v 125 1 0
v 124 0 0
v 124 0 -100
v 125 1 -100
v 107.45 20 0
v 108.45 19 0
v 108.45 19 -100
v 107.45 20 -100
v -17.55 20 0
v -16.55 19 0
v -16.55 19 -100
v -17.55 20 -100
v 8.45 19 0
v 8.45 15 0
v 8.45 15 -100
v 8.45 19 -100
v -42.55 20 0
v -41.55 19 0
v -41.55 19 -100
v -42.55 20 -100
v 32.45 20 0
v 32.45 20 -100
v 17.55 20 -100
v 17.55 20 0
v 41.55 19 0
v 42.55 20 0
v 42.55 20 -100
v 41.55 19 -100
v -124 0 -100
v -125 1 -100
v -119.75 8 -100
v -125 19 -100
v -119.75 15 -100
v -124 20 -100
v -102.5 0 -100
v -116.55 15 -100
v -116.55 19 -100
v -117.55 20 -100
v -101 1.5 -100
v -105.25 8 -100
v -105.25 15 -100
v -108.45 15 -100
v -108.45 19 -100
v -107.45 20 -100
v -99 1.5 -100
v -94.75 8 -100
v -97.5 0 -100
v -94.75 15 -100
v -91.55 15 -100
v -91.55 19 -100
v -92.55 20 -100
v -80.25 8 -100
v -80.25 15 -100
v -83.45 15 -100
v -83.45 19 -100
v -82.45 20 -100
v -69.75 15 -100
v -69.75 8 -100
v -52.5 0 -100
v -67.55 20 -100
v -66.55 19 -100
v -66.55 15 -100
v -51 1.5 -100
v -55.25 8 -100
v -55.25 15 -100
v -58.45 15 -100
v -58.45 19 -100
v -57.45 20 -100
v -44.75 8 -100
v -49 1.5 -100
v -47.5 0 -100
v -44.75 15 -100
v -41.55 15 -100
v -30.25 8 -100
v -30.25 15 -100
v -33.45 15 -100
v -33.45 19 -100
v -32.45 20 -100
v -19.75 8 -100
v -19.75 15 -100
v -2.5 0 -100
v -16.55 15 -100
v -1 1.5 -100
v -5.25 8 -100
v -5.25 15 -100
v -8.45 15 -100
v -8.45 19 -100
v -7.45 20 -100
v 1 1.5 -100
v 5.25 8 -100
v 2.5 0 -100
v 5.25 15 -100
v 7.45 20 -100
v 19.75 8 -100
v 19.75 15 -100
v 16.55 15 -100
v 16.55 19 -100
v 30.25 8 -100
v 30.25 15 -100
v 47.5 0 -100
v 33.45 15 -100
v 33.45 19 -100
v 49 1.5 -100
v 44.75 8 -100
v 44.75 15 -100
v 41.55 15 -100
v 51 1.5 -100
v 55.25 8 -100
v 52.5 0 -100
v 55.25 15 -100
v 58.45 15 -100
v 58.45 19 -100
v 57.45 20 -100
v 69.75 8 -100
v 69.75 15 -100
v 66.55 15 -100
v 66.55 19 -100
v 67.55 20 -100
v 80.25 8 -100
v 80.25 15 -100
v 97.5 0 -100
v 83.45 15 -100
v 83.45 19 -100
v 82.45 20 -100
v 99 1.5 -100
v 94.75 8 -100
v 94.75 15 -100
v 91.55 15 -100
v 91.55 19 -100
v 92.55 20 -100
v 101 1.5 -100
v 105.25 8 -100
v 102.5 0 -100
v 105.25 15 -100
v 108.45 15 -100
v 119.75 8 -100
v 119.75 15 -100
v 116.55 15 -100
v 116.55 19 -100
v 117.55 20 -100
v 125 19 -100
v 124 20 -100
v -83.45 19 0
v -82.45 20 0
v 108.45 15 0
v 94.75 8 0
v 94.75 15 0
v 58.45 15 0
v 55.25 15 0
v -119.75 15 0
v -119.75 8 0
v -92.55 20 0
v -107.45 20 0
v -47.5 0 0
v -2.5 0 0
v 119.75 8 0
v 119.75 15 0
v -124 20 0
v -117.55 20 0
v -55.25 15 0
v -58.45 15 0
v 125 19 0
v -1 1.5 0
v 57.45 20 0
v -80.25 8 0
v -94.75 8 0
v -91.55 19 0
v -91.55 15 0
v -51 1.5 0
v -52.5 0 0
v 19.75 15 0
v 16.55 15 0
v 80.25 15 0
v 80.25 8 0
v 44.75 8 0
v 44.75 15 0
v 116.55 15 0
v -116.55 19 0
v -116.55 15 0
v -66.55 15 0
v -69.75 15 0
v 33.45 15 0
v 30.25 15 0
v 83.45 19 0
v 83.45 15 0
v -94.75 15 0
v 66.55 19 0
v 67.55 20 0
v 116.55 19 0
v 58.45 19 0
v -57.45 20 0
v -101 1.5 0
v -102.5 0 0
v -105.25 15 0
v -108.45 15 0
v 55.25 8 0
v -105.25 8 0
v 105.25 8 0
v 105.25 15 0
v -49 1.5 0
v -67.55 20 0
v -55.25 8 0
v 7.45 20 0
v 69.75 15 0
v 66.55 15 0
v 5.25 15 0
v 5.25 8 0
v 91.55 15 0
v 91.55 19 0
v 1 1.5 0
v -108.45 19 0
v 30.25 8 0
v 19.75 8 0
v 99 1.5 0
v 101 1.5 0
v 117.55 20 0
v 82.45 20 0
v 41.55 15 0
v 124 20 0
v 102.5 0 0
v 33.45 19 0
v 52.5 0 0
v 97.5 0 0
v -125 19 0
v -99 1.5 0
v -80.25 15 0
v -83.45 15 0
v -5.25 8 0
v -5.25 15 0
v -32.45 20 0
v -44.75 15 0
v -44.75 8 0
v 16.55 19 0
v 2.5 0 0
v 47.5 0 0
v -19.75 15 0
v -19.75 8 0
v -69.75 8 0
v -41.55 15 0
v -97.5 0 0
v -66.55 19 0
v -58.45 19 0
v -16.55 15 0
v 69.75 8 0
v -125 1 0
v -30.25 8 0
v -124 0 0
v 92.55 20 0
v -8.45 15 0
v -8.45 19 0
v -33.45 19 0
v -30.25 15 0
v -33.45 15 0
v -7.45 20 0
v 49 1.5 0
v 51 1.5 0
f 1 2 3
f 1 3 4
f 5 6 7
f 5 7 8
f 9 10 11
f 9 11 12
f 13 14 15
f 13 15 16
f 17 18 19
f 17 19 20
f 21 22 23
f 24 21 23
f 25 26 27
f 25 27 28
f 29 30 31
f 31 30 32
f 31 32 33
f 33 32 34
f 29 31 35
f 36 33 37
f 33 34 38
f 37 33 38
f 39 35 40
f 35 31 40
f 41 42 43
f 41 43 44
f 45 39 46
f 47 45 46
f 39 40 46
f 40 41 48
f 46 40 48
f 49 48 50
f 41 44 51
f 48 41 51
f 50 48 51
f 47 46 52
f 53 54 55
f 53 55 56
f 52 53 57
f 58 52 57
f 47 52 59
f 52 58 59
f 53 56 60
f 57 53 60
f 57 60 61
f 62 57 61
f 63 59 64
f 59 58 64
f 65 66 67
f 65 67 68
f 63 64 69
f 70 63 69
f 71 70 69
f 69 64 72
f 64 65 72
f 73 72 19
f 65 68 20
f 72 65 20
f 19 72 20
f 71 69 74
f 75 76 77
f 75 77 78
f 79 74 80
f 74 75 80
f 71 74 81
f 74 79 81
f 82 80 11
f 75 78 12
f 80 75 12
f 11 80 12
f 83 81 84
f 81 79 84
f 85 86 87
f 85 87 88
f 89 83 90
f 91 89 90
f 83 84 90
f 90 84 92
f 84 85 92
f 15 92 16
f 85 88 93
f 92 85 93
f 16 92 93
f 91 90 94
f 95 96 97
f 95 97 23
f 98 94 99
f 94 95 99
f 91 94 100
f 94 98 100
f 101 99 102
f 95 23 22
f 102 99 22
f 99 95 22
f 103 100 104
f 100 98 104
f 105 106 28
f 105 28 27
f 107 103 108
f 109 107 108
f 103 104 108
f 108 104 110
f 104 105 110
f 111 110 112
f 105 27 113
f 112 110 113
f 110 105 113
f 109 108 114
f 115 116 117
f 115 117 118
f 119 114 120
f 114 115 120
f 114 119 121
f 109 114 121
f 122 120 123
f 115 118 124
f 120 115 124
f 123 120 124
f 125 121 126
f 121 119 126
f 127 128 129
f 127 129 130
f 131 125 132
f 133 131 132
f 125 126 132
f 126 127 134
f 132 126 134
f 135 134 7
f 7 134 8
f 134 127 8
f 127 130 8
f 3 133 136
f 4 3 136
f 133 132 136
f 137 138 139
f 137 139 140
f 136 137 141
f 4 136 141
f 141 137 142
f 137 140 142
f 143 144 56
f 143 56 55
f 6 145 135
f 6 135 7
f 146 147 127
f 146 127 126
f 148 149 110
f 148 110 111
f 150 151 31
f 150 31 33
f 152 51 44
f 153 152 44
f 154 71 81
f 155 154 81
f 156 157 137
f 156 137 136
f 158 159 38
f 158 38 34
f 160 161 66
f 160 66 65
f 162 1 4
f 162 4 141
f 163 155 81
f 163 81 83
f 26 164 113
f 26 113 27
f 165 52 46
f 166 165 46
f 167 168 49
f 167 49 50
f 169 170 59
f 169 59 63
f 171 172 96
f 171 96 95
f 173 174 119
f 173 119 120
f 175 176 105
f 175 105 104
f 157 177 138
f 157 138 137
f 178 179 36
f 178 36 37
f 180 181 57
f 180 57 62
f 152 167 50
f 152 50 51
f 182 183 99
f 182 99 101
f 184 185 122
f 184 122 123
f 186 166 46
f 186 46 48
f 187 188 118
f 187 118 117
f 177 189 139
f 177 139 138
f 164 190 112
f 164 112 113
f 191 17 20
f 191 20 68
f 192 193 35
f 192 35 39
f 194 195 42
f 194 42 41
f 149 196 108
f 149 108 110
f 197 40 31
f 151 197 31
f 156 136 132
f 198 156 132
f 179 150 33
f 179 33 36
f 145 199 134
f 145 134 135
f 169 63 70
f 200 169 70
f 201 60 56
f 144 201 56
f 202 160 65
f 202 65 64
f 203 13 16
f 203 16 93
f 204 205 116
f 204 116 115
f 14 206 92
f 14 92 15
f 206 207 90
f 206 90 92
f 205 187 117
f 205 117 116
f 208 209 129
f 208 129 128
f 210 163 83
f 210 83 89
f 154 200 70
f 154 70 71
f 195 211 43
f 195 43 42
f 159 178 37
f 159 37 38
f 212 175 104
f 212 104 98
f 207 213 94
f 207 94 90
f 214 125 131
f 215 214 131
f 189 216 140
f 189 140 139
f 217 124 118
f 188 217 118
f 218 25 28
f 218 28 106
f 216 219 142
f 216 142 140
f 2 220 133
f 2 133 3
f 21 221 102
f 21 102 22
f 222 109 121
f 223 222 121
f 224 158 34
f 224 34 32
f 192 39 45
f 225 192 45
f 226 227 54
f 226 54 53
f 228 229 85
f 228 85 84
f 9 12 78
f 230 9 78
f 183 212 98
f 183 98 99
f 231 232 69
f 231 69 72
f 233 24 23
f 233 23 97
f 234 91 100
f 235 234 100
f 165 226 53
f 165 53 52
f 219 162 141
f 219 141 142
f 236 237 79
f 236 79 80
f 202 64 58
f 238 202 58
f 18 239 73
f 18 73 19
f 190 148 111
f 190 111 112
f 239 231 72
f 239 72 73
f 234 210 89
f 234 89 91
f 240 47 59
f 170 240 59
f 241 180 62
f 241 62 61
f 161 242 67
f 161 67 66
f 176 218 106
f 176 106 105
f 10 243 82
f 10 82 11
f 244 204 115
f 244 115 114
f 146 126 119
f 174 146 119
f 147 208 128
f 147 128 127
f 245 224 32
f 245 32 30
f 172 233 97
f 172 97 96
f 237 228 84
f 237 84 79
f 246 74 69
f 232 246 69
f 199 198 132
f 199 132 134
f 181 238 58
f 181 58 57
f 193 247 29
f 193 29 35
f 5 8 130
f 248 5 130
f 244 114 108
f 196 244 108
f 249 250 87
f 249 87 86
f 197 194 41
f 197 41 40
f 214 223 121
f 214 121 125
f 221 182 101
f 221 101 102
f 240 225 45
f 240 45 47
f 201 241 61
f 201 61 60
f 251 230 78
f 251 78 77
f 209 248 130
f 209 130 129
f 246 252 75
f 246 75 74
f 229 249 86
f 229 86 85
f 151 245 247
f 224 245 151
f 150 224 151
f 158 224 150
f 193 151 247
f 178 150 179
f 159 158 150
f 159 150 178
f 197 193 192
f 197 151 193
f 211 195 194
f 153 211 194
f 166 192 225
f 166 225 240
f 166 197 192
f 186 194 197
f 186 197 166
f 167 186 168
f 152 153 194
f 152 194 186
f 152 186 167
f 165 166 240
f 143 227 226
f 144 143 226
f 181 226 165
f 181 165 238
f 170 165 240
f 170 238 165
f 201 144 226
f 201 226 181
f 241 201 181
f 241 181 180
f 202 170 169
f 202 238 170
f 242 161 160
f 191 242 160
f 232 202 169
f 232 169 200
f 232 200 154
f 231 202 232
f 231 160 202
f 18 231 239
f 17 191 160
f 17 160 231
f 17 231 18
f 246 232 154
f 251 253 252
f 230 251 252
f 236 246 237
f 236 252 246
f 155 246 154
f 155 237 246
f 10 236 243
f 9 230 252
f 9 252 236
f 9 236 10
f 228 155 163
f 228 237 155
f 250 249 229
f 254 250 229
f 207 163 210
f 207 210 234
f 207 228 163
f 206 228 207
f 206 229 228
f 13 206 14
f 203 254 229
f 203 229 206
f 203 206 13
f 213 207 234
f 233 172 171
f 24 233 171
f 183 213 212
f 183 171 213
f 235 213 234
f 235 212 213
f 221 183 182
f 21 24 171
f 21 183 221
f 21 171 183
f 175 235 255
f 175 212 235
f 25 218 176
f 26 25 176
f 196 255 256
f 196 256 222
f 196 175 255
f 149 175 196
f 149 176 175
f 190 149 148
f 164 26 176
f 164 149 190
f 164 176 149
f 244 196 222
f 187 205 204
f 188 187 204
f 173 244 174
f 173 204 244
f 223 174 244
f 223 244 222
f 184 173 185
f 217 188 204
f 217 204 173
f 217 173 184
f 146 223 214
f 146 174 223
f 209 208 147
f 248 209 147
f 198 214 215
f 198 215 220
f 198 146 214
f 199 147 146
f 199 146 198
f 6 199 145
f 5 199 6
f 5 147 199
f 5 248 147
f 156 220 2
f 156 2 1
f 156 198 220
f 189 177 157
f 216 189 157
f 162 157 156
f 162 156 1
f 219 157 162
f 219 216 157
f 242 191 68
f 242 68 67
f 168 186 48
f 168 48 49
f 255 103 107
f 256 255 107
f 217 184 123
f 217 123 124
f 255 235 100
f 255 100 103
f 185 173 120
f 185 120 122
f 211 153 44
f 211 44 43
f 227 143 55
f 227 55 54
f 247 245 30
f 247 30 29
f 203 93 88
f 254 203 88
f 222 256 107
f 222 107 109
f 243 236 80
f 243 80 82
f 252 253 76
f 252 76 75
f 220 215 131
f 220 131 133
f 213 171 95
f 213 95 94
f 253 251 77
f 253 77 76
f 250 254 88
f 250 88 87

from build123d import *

# Parameters (mm, degrees)
EXTRUDE_1_DEPTH = 100


with BuildPart() as part:
    # Эскиз1 → Бобышка-Вытянуть1 (new body)
    with BuildSketch(Plane.XY):
        Polygon((-52.5, 0), (-51, 1.5), (-49, 1.5), (-47.5, 0), (-2.5, 0), (-1, 1.5), (1, 1.5), (2.5, 0), (47.5, 0), (49, 1.5), (51, 1.5), (52.5, 0), (97.5, 0), (99, 1.5), (101, 1.5), (102.5, 0), (124, 0), (125, 1), (125, 19), (124, 20), (117.55, 20), (116.55, 19), (116.55, 15), (119.75, 15), (119.75, 8), (105.25, 8), (105.25, 15), (108.45, 15), (108.45, 19), (107.45, 20), (92.55, 20), (91.55, 19), (91.55, 15), (94.75, 15), (94.75, 8), (80.25, 8), (80.25, 15), (83.45, 15), (83.45, 19), (82.45, 20), (67.55, 20), (66.55, 19), (66.55, 15), (69.75, 15), (69.75, 8), (55.25, 8), (55.25, 15), (58.45, 15), (58.45, 19), (57.45, 20), (42.55, 20), (41.55, 19), (41.55, 15), (44.75, 15), (44.75, 8), (30.25, 8), (30.25, 15), (33.45, 15), (33.45, 19), (32.45, 20), (17.55, 20), (16.55, 19), (16.55, 15), (19.75, 15), (19.75, 8), (5.25, 8), (5.25, 15), (8.45, 15), (8.45, 19), (7.45, 20), (-7.45, 20), (-8.45, 19), (-8.45, 15), (-5.25, 15), (-5.25, 8), (-19.75, 8), (-19.75, 15), (-16.55, 15), (-16.55, 19), (-17.55, 20), (-32.45, 20), (-33.45, 19), (-33.45, 15), (-30.25, 15), (-30.25, 8), (-44.75, 8), (-44.75, 15), (-41.55, 15), (-41.55, 19), (-42.55, 20), (-57.45, 20), (-58.45, 19), (-58.45, 15), (-55.25, 15), (-55.25, 8), (-69.75, 8), (-69.75, 15), (-66.55, 15), (-66.55, 19), (-67.55, 20), (-82.45, 20), (-83.45, 19), (-83.45, 15), (-80.25, 15), (-80.25, 8), (-94.75, 8), (-94.75, 15), (-91.55, 15), (-91.55, 19), (-92.55, 20), (-107.45, 20), (-108.45, 19), (-108.45, 15), (-105.25, 15), (-105.25, 8), (-119.75, 8), (-119.75, 15), (-116.55, 15), (-116.55, 19), (-117.55, 20), (-124, 20), (-125, 19), (-125, 1), (-124, 0), (-102.5, 0), (-101, 1.5), (-99, 1.5), (-97.5, 0), align=None)
    extrude(amount=-EXTRUDE_1_DEPTH)


solid = part.part
